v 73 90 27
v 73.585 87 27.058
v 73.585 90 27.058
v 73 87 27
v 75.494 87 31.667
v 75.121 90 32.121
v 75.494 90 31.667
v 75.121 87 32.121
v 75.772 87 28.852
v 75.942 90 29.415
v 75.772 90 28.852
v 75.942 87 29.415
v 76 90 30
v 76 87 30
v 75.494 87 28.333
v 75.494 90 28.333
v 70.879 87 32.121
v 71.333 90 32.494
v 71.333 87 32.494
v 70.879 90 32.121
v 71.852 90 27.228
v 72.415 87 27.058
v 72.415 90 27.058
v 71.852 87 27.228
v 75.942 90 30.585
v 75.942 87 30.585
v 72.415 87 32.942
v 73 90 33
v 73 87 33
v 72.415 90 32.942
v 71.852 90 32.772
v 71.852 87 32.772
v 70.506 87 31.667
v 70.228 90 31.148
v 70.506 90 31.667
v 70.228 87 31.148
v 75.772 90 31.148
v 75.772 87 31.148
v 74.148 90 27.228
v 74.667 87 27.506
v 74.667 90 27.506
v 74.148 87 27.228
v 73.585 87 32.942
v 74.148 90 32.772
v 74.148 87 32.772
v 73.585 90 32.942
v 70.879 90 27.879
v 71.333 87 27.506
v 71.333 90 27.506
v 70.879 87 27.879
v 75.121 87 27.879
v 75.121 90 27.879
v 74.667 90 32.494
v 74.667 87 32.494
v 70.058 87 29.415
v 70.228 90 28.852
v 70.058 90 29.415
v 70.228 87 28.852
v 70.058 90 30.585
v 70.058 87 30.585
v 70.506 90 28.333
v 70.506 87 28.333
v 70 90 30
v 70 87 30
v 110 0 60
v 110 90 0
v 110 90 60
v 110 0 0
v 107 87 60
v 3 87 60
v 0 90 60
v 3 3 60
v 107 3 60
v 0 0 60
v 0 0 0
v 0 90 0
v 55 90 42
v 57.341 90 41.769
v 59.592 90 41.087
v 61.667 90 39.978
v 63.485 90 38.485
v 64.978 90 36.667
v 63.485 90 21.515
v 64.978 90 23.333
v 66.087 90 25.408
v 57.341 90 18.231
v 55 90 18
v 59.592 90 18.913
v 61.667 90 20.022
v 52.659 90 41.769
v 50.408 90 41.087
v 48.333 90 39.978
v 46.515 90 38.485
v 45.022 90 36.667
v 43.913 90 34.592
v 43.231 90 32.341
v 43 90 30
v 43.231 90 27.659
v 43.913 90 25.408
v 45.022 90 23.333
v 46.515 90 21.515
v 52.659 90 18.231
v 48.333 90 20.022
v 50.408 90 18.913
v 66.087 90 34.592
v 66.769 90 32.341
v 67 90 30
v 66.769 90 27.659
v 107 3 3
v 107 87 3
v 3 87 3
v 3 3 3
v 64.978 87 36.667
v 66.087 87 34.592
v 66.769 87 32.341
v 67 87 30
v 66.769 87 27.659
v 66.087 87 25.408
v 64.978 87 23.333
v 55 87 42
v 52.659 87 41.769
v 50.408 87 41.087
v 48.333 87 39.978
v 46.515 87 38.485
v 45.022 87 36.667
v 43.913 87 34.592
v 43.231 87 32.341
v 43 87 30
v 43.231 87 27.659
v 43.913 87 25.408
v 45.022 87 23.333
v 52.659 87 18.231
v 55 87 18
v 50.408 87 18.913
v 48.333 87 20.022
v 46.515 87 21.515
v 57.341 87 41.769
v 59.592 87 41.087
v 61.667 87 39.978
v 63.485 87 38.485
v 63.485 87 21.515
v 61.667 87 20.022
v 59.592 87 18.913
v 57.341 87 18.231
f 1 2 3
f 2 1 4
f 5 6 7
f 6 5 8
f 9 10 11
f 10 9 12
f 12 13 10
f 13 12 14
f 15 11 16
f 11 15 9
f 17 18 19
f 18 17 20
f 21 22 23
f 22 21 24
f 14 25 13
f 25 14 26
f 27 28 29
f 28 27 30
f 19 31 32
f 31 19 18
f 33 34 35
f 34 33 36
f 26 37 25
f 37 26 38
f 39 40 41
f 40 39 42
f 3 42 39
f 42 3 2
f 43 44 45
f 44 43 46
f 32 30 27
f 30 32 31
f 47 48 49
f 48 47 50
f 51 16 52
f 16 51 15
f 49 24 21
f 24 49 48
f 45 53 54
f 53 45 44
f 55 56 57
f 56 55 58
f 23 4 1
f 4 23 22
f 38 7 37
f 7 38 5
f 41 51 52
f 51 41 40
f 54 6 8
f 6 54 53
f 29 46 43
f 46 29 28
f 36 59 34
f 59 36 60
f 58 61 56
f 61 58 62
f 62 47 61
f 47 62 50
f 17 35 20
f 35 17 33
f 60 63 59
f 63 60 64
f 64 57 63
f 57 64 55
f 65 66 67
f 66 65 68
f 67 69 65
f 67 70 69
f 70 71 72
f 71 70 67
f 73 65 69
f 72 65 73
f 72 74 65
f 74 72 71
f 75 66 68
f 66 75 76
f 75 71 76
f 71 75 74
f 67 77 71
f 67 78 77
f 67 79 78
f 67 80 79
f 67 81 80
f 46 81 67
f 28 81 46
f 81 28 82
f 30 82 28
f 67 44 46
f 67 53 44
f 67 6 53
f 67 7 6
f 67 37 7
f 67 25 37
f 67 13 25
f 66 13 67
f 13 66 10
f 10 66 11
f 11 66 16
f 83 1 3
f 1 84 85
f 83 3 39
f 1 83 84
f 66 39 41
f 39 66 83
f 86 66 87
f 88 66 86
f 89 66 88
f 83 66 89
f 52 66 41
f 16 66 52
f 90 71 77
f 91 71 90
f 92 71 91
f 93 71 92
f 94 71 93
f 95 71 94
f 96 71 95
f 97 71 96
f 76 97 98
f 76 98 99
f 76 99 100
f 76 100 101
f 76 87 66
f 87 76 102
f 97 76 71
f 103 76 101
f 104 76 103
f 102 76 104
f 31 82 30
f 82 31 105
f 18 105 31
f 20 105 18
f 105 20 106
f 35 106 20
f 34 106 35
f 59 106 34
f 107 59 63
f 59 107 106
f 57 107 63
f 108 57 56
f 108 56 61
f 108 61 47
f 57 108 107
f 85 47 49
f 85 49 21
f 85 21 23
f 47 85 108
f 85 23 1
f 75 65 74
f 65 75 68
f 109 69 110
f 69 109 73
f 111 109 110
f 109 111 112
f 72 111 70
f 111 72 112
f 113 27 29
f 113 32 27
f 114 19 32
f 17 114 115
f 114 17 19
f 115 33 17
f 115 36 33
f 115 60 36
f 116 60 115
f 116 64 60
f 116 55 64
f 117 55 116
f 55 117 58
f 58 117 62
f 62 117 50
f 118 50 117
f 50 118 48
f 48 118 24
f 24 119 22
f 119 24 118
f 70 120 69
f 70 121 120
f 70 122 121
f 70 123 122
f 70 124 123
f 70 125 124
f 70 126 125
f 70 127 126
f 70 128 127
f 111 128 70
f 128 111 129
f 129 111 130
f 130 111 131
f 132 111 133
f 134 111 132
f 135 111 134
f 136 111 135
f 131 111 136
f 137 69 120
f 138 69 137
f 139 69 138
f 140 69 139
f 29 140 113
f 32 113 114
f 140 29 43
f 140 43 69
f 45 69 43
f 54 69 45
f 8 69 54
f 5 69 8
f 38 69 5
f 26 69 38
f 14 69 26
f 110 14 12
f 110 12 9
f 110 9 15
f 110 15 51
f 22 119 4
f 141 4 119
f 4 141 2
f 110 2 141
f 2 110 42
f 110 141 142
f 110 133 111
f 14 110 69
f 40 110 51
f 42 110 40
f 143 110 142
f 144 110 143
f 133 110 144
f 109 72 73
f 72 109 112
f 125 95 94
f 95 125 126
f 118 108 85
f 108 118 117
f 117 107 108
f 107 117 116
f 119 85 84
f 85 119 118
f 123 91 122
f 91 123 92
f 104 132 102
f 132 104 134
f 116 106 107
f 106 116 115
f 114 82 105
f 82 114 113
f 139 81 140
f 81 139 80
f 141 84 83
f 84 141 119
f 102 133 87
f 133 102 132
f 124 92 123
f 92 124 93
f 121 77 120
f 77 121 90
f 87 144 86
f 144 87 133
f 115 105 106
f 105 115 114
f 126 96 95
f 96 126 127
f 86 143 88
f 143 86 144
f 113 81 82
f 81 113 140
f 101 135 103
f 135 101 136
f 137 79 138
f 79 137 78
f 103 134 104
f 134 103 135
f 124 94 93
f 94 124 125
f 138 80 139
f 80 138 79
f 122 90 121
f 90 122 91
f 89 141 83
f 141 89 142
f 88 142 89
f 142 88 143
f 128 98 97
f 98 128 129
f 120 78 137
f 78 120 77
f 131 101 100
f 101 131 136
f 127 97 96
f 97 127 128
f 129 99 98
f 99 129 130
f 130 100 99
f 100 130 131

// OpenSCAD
$fn = 32;

// ----------------------------------------------------------------------
// Vent box: roundvent enclosure
// ----------------------------------------------------------------------

// --- parameters (mm) ---
box_l = 110;              // box length, X
box_w = 90;               // box width, Y
box_h = 60;               // box height, Z
wall_t = 3;               // shell wall thickness
vent_d = 24;              // central vent diameter
ring_d = 6;               // ring hole diameter
n_ring = 8;               // holes in the ring
ring_r = 18;              // ring radius

ring_step = 360 / n_ring;  // ring hole angular step

difference() {
  cube([box_l, box_w, box_h]);
  translate([wall_t, wall_t, wall_t])
    cube([box_l - 2 * wall_t, box_w - 2 * wall_t, box_h]);
  translate([box_l / 2, box_w - wall_t - 1, box_h / 2])
    rotate([-90, 0, 0]) cylinder(h = wall_t + 2, d = vent_d);
  for (i = [0 : n_ring - 1])
    translate([box_l / 2, box_w - wall_t - 1, box_h / 2])
      rotate([0, 0, i * ring_step])
        translate([ring_r, 0, 0]) rotate([-90, 0, 0])
          cylinder(h = wall_t + 2, d = ring_d);
}
